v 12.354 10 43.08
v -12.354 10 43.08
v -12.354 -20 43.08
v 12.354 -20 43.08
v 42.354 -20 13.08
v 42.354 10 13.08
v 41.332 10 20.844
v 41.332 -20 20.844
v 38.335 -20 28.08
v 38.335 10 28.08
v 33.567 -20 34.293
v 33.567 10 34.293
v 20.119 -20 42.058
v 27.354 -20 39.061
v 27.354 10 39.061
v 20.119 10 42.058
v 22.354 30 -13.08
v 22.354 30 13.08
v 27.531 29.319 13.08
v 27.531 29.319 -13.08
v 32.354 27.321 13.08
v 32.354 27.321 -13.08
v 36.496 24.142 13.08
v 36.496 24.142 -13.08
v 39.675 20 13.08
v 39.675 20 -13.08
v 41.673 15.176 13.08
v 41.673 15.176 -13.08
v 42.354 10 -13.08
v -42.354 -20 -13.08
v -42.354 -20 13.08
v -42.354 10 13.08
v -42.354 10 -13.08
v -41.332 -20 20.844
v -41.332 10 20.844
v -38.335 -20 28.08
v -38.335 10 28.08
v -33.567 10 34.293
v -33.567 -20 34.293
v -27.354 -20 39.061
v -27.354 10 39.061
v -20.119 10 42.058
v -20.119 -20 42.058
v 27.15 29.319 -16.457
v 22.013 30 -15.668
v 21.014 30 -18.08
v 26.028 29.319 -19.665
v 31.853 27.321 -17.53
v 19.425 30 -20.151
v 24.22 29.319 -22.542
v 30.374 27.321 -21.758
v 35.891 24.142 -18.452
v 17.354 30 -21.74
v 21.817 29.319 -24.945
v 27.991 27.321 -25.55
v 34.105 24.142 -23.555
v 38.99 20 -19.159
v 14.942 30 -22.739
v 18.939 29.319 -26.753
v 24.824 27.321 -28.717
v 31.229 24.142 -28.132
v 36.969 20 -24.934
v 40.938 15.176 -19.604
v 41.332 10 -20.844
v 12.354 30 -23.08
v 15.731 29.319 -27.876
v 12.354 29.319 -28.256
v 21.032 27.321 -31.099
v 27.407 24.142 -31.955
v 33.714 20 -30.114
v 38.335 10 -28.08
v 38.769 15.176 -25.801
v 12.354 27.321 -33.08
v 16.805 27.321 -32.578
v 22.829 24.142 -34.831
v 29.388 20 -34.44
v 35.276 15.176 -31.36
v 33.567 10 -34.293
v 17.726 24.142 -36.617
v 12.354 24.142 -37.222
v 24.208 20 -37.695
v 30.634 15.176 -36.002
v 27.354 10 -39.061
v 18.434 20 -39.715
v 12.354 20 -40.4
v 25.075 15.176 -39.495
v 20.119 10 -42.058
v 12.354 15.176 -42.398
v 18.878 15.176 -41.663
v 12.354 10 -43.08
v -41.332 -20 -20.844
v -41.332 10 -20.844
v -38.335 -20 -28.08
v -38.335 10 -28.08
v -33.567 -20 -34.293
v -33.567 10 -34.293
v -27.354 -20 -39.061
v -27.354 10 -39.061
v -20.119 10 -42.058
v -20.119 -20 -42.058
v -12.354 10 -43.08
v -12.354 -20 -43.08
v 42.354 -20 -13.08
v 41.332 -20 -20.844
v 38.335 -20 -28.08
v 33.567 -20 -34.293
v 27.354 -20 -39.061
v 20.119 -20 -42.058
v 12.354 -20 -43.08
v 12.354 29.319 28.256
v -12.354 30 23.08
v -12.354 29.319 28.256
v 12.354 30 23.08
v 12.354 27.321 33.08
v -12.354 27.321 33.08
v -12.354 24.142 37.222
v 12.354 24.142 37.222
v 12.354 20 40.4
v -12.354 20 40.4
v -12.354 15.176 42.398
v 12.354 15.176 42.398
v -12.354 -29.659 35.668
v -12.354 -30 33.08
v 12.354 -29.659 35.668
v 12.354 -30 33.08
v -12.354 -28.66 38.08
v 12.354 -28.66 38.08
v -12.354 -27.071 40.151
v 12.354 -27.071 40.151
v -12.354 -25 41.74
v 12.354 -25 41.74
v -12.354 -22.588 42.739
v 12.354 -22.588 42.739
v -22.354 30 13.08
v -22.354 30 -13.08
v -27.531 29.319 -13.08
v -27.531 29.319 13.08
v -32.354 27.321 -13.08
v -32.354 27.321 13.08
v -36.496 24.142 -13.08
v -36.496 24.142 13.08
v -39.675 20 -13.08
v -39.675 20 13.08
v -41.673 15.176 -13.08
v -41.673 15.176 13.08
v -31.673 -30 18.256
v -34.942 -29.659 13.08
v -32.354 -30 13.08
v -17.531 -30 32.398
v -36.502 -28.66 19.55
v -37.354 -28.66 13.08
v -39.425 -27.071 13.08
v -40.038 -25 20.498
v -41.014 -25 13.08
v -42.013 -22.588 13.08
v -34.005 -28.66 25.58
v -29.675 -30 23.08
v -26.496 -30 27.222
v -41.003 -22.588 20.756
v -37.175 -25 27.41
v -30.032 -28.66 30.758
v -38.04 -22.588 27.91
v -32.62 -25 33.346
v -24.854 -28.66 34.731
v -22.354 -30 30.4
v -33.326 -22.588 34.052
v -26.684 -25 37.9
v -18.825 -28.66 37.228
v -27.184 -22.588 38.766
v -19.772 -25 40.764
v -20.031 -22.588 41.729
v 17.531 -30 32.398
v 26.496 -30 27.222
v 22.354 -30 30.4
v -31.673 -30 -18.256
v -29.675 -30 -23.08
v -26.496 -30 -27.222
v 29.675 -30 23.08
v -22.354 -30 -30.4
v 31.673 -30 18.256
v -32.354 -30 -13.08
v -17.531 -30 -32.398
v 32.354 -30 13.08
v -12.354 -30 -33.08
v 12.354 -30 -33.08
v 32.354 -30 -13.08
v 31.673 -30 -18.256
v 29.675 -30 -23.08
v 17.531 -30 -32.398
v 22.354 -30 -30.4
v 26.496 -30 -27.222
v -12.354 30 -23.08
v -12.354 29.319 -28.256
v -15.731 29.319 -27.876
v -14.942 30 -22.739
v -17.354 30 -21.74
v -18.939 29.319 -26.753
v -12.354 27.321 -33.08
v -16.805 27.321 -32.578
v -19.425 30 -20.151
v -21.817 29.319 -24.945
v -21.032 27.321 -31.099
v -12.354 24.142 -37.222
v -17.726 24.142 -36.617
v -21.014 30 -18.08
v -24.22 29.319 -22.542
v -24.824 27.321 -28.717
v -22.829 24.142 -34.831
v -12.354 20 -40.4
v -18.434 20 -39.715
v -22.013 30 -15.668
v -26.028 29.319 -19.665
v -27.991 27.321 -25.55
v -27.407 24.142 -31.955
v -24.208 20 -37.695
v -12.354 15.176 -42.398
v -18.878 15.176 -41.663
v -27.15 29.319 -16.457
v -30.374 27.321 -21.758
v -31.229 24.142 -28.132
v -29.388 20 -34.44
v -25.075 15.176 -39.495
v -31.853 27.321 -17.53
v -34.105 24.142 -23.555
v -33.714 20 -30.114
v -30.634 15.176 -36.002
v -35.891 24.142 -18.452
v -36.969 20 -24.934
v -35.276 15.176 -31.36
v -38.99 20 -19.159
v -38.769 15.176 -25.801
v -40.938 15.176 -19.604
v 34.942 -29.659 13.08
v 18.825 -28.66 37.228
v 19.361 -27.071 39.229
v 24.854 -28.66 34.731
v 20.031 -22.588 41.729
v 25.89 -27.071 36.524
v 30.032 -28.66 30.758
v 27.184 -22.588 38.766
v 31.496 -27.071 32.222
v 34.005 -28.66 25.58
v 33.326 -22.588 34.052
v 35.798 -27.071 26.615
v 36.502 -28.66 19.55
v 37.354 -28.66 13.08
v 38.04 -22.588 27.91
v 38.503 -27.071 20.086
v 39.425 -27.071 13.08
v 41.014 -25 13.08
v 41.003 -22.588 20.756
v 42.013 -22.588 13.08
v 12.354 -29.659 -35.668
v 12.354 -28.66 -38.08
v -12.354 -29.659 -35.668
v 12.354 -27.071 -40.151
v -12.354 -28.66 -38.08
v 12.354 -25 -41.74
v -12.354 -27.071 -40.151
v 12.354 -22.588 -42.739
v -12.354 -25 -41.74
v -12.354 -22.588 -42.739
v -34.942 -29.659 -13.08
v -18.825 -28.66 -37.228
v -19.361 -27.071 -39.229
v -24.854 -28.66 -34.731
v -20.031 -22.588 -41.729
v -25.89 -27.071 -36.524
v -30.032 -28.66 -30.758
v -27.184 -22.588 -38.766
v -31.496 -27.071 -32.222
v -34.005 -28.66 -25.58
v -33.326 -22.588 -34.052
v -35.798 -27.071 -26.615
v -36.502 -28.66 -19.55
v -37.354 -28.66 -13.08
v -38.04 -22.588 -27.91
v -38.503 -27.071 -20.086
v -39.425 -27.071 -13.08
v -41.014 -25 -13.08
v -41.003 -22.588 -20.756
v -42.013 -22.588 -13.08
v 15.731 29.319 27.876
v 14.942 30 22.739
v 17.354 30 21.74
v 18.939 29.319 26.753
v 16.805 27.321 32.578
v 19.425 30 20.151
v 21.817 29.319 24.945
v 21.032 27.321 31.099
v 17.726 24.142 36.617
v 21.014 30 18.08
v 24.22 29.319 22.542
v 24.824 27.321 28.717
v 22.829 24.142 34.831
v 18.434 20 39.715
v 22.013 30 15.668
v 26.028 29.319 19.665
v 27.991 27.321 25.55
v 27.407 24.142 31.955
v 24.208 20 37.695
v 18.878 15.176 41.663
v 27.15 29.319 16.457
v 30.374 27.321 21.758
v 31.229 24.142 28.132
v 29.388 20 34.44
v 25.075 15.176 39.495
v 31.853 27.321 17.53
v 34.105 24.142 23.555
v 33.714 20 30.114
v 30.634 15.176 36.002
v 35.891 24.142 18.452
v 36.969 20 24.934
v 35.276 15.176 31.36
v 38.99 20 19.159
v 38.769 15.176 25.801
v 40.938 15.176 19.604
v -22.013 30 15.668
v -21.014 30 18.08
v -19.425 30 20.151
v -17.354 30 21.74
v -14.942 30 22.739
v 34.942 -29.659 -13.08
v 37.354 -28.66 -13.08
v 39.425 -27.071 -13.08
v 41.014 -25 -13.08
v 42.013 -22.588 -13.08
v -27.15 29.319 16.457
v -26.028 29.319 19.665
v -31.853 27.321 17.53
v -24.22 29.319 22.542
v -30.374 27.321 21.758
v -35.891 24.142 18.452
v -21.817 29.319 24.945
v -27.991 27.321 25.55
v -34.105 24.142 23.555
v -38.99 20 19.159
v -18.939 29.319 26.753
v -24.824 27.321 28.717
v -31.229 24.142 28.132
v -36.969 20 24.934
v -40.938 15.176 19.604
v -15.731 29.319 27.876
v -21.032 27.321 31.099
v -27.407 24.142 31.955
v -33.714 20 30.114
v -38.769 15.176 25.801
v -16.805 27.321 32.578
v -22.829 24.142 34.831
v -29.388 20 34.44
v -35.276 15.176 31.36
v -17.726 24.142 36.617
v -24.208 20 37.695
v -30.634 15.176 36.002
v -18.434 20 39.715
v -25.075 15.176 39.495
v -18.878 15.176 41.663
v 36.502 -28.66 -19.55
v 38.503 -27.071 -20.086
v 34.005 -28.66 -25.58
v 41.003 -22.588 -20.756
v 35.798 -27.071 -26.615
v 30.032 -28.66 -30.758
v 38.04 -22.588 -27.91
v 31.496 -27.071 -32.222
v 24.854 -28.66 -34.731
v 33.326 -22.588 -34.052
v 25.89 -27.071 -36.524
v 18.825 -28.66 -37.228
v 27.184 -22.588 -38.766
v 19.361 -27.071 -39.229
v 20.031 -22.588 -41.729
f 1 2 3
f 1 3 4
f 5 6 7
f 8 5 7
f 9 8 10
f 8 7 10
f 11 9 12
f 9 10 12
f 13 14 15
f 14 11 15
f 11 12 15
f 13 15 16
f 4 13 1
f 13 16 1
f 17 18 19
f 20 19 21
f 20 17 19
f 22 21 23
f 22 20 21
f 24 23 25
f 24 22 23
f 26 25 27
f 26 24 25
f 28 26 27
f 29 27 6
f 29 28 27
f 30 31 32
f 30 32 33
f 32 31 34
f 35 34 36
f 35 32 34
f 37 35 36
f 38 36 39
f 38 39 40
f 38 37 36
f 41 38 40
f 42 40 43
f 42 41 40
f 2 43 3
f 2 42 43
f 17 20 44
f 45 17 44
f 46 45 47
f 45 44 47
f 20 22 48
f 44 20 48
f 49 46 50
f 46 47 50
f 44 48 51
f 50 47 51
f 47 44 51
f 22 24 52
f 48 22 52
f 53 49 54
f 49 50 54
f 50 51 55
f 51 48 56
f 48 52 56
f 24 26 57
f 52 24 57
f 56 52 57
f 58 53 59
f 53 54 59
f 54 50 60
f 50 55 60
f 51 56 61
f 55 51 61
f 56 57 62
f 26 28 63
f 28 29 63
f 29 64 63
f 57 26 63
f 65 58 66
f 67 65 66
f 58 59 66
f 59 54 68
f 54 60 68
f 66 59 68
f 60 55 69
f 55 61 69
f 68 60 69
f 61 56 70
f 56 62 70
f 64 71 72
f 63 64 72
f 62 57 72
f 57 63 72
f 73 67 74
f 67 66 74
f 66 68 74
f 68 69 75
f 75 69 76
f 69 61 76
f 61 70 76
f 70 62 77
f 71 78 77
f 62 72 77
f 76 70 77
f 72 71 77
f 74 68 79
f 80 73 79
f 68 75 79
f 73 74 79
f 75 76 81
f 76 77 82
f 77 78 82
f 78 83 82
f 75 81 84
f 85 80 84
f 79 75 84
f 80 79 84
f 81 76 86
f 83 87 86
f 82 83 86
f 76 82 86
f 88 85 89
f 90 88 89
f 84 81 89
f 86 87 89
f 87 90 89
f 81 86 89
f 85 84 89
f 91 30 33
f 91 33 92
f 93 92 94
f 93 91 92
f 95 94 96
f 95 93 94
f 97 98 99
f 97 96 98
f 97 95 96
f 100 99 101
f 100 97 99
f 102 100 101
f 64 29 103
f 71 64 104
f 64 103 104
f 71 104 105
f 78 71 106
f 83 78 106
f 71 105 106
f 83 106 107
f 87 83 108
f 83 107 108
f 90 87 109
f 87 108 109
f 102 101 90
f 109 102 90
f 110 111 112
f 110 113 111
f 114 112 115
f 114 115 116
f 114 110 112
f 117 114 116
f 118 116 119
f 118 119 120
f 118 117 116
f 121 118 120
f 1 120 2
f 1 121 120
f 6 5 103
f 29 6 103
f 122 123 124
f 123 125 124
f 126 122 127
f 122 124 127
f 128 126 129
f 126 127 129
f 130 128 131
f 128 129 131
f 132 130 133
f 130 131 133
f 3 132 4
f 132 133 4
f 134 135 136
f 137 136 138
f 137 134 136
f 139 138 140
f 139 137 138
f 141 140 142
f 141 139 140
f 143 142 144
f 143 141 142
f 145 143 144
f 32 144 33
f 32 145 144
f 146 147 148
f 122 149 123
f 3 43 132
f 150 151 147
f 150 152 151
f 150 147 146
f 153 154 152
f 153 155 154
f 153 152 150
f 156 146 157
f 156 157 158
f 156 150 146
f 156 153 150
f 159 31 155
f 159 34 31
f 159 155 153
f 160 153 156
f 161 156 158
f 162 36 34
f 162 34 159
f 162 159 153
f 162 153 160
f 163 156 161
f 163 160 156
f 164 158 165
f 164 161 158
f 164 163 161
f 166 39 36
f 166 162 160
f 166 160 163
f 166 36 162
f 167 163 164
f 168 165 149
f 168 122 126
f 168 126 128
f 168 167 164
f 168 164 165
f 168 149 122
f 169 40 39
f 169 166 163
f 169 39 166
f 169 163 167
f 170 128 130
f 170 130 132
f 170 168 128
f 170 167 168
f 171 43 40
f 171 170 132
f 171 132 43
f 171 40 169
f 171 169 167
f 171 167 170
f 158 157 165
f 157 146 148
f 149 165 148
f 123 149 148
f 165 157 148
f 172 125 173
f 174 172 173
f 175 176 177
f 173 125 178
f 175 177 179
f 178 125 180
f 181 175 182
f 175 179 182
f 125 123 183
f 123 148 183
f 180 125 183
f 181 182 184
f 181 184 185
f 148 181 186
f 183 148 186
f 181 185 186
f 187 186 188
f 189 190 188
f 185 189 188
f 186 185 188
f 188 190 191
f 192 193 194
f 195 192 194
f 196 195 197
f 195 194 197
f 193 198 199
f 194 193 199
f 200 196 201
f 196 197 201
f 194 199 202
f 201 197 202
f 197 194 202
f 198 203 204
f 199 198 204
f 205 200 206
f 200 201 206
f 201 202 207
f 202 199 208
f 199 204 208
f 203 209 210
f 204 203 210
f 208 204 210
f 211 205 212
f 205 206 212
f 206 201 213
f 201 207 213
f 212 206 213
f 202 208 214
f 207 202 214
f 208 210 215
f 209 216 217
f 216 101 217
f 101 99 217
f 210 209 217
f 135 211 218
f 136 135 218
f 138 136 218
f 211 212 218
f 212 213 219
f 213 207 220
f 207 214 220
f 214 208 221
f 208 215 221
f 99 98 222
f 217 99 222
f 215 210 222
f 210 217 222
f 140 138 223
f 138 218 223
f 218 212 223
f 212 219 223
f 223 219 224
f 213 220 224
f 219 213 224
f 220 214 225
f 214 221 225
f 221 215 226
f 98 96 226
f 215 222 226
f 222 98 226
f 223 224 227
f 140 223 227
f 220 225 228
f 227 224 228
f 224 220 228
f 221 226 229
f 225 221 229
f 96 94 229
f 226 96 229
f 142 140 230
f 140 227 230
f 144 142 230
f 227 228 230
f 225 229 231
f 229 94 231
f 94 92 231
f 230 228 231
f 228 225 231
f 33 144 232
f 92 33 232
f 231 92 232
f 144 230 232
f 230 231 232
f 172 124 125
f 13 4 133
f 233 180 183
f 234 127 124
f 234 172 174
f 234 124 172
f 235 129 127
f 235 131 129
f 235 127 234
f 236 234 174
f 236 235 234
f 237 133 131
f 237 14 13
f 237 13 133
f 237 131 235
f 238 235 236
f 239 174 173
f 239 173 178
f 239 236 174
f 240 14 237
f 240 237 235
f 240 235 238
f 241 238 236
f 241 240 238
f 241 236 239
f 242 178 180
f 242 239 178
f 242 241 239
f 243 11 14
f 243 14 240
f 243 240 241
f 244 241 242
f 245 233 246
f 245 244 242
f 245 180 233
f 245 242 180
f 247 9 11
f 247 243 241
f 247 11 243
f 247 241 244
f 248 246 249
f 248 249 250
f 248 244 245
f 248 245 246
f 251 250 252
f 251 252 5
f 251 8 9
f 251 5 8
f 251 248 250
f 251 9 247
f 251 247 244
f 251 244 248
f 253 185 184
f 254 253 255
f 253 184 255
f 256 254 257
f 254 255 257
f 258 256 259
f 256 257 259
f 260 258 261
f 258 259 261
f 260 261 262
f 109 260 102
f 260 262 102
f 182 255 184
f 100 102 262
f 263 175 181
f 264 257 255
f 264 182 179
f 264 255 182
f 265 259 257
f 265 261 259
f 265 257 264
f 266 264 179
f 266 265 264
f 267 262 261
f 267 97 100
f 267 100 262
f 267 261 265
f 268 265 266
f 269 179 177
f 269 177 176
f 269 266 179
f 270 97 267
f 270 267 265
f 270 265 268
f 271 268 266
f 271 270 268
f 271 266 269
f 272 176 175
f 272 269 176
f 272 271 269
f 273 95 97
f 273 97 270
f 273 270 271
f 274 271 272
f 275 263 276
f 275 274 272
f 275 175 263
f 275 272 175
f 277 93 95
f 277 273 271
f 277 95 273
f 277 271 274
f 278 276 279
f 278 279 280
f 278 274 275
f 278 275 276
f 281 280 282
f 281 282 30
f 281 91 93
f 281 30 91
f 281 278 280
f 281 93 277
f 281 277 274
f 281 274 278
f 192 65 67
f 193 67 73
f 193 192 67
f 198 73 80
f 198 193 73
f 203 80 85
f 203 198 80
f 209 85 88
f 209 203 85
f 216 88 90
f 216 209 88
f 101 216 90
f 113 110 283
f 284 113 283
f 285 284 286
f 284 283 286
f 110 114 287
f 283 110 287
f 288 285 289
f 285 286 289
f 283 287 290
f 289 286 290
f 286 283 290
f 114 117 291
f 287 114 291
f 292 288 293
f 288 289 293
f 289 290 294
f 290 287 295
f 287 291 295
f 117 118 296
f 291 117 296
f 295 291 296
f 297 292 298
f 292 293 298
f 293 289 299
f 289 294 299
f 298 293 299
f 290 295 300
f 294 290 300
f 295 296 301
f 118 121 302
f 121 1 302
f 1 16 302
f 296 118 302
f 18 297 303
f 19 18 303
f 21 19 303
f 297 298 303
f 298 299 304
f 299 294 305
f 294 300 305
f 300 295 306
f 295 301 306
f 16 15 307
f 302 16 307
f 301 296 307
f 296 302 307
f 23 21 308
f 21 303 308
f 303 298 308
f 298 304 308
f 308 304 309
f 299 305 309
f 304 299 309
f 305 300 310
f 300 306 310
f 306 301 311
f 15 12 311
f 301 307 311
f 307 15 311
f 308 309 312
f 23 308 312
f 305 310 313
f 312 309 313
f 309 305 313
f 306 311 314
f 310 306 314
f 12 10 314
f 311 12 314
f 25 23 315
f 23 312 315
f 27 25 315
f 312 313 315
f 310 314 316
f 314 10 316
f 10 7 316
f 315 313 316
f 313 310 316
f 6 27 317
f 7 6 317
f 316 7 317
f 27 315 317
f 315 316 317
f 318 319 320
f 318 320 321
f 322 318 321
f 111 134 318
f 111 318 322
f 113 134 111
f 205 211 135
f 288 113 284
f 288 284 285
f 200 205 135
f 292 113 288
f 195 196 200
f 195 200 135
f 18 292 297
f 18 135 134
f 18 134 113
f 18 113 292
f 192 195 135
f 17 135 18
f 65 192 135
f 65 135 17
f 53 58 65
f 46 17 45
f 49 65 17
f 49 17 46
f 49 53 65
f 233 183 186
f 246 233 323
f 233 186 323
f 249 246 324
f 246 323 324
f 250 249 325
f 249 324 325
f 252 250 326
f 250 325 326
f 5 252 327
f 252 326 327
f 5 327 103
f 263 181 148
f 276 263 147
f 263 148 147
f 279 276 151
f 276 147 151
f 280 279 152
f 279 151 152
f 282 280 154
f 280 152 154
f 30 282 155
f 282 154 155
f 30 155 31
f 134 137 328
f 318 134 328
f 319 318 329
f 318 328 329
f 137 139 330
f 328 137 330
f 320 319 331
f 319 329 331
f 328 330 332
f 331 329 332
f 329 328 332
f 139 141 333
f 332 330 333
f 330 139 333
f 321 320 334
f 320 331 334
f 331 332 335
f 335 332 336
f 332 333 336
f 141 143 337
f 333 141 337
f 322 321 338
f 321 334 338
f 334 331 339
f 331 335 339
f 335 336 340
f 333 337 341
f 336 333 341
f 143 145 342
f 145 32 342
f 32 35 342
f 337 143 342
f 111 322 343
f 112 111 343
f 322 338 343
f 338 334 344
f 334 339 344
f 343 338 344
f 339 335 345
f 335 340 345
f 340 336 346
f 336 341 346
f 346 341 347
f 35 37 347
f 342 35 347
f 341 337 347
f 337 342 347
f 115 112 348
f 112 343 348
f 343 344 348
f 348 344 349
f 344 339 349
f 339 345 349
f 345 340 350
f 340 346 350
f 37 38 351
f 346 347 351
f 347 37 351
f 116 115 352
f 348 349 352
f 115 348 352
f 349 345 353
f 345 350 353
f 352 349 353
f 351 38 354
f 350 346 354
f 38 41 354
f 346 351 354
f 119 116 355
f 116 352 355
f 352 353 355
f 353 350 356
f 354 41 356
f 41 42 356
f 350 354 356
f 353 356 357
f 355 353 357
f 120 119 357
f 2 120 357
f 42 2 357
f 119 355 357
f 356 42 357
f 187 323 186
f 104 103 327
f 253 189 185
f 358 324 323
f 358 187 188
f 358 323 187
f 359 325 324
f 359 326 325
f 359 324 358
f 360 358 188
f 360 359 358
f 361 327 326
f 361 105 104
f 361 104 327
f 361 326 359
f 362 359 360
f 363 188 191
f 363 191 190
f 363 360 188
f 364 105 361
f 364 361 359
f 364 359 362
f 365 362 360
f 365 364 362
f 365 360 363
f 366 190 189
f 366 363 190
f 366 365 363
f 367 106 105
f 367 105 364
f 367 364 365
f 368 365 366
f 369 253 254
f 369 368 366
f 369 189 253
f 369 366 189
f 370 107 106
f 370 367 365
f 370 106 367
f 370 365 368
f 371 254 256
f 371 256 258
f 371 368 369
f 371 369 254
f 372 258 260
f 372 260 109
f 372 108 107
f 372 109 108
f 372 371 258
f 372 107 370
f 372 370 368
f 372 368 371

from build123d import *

# Parameters (mm, degrees)
SKETCH1_W                = 84.708364016
SKETCH1_H                = 86.159780402
BOSS_EXTRUDE1_DEPTH      = 30
BOSS_EXTRUDE1_DEPTH_BACK = 30
FILLET1_R                = 30
FILLET2_R                = 20
FILLET3_R                = 10


with BuildPart() as part:
    # Sketch1 → Boss-Extrude1 (new body, two sides)
    with BuildSketch(Plane(origin=(0, 0, 0), x_dir=(1, 0, 0), z_dir=(0, 1, 0))) as boss_extrude1_sk:
        Rectangle(SKETCH1_W, SKETCH1_H)
    extrude(amount=BOSS_EXTRUDE1_DEPTH)
    extrude(boss_extrude1_sk.sketch, amount=-BOSS_EXTRUDE1_DEPTH_BACK)

    # Fillet1
    fillet1_edges = [part.edges().sort_by_distance(p)[0] for p in [
        (42.354182008, 0, 43.079890201),
        (-42.354182008, 0, 43.079890201),
        (-42.354182008, 0, -43.079890201),
        (42.354182008, 0, -43.079890201),
    ]]
    fillet(fillet1_edges, radius=FILLET1_R)

    # Fillet2
    fillet2_edges = [part.edges().sort_by_distance(p)[0] for p in [
        (0, 30, 43.079890201),
        (42.354182008, 30, 0),
        (0, 30, -43.079890201),
        (-42.354182008, 30, 0),
        (-33.567385444, 30, -34.293093637),
        (-33.567385444, 30, 34.293093637),
        (33.567385444, 30, -34.293093637),
        (33.567385444, 30, 34.293093637),
    ]]
    fillet(fillet2_edges, radius=FILLET2_R)

    # Fillet3
    fillet3_edges = [part.edges().sort_by_distance(p)[0] for p in [
        (0, -30, 43.079890201),
        (42.354182008, -30, 0),
        (-42.354182008, -30, 0),
        (0, -30, -43.079890201),
        (-33.567385444, -30, -34.293093637),
        (-33.567385444, -30, 34.293093637),
        (33.567385444, -30, -34.293093637),
        (33.567385444, -30, 34.293093637),
    ]]
    fillet(fillet3_edges, radius=FILLET3_R)


solid = part.part
